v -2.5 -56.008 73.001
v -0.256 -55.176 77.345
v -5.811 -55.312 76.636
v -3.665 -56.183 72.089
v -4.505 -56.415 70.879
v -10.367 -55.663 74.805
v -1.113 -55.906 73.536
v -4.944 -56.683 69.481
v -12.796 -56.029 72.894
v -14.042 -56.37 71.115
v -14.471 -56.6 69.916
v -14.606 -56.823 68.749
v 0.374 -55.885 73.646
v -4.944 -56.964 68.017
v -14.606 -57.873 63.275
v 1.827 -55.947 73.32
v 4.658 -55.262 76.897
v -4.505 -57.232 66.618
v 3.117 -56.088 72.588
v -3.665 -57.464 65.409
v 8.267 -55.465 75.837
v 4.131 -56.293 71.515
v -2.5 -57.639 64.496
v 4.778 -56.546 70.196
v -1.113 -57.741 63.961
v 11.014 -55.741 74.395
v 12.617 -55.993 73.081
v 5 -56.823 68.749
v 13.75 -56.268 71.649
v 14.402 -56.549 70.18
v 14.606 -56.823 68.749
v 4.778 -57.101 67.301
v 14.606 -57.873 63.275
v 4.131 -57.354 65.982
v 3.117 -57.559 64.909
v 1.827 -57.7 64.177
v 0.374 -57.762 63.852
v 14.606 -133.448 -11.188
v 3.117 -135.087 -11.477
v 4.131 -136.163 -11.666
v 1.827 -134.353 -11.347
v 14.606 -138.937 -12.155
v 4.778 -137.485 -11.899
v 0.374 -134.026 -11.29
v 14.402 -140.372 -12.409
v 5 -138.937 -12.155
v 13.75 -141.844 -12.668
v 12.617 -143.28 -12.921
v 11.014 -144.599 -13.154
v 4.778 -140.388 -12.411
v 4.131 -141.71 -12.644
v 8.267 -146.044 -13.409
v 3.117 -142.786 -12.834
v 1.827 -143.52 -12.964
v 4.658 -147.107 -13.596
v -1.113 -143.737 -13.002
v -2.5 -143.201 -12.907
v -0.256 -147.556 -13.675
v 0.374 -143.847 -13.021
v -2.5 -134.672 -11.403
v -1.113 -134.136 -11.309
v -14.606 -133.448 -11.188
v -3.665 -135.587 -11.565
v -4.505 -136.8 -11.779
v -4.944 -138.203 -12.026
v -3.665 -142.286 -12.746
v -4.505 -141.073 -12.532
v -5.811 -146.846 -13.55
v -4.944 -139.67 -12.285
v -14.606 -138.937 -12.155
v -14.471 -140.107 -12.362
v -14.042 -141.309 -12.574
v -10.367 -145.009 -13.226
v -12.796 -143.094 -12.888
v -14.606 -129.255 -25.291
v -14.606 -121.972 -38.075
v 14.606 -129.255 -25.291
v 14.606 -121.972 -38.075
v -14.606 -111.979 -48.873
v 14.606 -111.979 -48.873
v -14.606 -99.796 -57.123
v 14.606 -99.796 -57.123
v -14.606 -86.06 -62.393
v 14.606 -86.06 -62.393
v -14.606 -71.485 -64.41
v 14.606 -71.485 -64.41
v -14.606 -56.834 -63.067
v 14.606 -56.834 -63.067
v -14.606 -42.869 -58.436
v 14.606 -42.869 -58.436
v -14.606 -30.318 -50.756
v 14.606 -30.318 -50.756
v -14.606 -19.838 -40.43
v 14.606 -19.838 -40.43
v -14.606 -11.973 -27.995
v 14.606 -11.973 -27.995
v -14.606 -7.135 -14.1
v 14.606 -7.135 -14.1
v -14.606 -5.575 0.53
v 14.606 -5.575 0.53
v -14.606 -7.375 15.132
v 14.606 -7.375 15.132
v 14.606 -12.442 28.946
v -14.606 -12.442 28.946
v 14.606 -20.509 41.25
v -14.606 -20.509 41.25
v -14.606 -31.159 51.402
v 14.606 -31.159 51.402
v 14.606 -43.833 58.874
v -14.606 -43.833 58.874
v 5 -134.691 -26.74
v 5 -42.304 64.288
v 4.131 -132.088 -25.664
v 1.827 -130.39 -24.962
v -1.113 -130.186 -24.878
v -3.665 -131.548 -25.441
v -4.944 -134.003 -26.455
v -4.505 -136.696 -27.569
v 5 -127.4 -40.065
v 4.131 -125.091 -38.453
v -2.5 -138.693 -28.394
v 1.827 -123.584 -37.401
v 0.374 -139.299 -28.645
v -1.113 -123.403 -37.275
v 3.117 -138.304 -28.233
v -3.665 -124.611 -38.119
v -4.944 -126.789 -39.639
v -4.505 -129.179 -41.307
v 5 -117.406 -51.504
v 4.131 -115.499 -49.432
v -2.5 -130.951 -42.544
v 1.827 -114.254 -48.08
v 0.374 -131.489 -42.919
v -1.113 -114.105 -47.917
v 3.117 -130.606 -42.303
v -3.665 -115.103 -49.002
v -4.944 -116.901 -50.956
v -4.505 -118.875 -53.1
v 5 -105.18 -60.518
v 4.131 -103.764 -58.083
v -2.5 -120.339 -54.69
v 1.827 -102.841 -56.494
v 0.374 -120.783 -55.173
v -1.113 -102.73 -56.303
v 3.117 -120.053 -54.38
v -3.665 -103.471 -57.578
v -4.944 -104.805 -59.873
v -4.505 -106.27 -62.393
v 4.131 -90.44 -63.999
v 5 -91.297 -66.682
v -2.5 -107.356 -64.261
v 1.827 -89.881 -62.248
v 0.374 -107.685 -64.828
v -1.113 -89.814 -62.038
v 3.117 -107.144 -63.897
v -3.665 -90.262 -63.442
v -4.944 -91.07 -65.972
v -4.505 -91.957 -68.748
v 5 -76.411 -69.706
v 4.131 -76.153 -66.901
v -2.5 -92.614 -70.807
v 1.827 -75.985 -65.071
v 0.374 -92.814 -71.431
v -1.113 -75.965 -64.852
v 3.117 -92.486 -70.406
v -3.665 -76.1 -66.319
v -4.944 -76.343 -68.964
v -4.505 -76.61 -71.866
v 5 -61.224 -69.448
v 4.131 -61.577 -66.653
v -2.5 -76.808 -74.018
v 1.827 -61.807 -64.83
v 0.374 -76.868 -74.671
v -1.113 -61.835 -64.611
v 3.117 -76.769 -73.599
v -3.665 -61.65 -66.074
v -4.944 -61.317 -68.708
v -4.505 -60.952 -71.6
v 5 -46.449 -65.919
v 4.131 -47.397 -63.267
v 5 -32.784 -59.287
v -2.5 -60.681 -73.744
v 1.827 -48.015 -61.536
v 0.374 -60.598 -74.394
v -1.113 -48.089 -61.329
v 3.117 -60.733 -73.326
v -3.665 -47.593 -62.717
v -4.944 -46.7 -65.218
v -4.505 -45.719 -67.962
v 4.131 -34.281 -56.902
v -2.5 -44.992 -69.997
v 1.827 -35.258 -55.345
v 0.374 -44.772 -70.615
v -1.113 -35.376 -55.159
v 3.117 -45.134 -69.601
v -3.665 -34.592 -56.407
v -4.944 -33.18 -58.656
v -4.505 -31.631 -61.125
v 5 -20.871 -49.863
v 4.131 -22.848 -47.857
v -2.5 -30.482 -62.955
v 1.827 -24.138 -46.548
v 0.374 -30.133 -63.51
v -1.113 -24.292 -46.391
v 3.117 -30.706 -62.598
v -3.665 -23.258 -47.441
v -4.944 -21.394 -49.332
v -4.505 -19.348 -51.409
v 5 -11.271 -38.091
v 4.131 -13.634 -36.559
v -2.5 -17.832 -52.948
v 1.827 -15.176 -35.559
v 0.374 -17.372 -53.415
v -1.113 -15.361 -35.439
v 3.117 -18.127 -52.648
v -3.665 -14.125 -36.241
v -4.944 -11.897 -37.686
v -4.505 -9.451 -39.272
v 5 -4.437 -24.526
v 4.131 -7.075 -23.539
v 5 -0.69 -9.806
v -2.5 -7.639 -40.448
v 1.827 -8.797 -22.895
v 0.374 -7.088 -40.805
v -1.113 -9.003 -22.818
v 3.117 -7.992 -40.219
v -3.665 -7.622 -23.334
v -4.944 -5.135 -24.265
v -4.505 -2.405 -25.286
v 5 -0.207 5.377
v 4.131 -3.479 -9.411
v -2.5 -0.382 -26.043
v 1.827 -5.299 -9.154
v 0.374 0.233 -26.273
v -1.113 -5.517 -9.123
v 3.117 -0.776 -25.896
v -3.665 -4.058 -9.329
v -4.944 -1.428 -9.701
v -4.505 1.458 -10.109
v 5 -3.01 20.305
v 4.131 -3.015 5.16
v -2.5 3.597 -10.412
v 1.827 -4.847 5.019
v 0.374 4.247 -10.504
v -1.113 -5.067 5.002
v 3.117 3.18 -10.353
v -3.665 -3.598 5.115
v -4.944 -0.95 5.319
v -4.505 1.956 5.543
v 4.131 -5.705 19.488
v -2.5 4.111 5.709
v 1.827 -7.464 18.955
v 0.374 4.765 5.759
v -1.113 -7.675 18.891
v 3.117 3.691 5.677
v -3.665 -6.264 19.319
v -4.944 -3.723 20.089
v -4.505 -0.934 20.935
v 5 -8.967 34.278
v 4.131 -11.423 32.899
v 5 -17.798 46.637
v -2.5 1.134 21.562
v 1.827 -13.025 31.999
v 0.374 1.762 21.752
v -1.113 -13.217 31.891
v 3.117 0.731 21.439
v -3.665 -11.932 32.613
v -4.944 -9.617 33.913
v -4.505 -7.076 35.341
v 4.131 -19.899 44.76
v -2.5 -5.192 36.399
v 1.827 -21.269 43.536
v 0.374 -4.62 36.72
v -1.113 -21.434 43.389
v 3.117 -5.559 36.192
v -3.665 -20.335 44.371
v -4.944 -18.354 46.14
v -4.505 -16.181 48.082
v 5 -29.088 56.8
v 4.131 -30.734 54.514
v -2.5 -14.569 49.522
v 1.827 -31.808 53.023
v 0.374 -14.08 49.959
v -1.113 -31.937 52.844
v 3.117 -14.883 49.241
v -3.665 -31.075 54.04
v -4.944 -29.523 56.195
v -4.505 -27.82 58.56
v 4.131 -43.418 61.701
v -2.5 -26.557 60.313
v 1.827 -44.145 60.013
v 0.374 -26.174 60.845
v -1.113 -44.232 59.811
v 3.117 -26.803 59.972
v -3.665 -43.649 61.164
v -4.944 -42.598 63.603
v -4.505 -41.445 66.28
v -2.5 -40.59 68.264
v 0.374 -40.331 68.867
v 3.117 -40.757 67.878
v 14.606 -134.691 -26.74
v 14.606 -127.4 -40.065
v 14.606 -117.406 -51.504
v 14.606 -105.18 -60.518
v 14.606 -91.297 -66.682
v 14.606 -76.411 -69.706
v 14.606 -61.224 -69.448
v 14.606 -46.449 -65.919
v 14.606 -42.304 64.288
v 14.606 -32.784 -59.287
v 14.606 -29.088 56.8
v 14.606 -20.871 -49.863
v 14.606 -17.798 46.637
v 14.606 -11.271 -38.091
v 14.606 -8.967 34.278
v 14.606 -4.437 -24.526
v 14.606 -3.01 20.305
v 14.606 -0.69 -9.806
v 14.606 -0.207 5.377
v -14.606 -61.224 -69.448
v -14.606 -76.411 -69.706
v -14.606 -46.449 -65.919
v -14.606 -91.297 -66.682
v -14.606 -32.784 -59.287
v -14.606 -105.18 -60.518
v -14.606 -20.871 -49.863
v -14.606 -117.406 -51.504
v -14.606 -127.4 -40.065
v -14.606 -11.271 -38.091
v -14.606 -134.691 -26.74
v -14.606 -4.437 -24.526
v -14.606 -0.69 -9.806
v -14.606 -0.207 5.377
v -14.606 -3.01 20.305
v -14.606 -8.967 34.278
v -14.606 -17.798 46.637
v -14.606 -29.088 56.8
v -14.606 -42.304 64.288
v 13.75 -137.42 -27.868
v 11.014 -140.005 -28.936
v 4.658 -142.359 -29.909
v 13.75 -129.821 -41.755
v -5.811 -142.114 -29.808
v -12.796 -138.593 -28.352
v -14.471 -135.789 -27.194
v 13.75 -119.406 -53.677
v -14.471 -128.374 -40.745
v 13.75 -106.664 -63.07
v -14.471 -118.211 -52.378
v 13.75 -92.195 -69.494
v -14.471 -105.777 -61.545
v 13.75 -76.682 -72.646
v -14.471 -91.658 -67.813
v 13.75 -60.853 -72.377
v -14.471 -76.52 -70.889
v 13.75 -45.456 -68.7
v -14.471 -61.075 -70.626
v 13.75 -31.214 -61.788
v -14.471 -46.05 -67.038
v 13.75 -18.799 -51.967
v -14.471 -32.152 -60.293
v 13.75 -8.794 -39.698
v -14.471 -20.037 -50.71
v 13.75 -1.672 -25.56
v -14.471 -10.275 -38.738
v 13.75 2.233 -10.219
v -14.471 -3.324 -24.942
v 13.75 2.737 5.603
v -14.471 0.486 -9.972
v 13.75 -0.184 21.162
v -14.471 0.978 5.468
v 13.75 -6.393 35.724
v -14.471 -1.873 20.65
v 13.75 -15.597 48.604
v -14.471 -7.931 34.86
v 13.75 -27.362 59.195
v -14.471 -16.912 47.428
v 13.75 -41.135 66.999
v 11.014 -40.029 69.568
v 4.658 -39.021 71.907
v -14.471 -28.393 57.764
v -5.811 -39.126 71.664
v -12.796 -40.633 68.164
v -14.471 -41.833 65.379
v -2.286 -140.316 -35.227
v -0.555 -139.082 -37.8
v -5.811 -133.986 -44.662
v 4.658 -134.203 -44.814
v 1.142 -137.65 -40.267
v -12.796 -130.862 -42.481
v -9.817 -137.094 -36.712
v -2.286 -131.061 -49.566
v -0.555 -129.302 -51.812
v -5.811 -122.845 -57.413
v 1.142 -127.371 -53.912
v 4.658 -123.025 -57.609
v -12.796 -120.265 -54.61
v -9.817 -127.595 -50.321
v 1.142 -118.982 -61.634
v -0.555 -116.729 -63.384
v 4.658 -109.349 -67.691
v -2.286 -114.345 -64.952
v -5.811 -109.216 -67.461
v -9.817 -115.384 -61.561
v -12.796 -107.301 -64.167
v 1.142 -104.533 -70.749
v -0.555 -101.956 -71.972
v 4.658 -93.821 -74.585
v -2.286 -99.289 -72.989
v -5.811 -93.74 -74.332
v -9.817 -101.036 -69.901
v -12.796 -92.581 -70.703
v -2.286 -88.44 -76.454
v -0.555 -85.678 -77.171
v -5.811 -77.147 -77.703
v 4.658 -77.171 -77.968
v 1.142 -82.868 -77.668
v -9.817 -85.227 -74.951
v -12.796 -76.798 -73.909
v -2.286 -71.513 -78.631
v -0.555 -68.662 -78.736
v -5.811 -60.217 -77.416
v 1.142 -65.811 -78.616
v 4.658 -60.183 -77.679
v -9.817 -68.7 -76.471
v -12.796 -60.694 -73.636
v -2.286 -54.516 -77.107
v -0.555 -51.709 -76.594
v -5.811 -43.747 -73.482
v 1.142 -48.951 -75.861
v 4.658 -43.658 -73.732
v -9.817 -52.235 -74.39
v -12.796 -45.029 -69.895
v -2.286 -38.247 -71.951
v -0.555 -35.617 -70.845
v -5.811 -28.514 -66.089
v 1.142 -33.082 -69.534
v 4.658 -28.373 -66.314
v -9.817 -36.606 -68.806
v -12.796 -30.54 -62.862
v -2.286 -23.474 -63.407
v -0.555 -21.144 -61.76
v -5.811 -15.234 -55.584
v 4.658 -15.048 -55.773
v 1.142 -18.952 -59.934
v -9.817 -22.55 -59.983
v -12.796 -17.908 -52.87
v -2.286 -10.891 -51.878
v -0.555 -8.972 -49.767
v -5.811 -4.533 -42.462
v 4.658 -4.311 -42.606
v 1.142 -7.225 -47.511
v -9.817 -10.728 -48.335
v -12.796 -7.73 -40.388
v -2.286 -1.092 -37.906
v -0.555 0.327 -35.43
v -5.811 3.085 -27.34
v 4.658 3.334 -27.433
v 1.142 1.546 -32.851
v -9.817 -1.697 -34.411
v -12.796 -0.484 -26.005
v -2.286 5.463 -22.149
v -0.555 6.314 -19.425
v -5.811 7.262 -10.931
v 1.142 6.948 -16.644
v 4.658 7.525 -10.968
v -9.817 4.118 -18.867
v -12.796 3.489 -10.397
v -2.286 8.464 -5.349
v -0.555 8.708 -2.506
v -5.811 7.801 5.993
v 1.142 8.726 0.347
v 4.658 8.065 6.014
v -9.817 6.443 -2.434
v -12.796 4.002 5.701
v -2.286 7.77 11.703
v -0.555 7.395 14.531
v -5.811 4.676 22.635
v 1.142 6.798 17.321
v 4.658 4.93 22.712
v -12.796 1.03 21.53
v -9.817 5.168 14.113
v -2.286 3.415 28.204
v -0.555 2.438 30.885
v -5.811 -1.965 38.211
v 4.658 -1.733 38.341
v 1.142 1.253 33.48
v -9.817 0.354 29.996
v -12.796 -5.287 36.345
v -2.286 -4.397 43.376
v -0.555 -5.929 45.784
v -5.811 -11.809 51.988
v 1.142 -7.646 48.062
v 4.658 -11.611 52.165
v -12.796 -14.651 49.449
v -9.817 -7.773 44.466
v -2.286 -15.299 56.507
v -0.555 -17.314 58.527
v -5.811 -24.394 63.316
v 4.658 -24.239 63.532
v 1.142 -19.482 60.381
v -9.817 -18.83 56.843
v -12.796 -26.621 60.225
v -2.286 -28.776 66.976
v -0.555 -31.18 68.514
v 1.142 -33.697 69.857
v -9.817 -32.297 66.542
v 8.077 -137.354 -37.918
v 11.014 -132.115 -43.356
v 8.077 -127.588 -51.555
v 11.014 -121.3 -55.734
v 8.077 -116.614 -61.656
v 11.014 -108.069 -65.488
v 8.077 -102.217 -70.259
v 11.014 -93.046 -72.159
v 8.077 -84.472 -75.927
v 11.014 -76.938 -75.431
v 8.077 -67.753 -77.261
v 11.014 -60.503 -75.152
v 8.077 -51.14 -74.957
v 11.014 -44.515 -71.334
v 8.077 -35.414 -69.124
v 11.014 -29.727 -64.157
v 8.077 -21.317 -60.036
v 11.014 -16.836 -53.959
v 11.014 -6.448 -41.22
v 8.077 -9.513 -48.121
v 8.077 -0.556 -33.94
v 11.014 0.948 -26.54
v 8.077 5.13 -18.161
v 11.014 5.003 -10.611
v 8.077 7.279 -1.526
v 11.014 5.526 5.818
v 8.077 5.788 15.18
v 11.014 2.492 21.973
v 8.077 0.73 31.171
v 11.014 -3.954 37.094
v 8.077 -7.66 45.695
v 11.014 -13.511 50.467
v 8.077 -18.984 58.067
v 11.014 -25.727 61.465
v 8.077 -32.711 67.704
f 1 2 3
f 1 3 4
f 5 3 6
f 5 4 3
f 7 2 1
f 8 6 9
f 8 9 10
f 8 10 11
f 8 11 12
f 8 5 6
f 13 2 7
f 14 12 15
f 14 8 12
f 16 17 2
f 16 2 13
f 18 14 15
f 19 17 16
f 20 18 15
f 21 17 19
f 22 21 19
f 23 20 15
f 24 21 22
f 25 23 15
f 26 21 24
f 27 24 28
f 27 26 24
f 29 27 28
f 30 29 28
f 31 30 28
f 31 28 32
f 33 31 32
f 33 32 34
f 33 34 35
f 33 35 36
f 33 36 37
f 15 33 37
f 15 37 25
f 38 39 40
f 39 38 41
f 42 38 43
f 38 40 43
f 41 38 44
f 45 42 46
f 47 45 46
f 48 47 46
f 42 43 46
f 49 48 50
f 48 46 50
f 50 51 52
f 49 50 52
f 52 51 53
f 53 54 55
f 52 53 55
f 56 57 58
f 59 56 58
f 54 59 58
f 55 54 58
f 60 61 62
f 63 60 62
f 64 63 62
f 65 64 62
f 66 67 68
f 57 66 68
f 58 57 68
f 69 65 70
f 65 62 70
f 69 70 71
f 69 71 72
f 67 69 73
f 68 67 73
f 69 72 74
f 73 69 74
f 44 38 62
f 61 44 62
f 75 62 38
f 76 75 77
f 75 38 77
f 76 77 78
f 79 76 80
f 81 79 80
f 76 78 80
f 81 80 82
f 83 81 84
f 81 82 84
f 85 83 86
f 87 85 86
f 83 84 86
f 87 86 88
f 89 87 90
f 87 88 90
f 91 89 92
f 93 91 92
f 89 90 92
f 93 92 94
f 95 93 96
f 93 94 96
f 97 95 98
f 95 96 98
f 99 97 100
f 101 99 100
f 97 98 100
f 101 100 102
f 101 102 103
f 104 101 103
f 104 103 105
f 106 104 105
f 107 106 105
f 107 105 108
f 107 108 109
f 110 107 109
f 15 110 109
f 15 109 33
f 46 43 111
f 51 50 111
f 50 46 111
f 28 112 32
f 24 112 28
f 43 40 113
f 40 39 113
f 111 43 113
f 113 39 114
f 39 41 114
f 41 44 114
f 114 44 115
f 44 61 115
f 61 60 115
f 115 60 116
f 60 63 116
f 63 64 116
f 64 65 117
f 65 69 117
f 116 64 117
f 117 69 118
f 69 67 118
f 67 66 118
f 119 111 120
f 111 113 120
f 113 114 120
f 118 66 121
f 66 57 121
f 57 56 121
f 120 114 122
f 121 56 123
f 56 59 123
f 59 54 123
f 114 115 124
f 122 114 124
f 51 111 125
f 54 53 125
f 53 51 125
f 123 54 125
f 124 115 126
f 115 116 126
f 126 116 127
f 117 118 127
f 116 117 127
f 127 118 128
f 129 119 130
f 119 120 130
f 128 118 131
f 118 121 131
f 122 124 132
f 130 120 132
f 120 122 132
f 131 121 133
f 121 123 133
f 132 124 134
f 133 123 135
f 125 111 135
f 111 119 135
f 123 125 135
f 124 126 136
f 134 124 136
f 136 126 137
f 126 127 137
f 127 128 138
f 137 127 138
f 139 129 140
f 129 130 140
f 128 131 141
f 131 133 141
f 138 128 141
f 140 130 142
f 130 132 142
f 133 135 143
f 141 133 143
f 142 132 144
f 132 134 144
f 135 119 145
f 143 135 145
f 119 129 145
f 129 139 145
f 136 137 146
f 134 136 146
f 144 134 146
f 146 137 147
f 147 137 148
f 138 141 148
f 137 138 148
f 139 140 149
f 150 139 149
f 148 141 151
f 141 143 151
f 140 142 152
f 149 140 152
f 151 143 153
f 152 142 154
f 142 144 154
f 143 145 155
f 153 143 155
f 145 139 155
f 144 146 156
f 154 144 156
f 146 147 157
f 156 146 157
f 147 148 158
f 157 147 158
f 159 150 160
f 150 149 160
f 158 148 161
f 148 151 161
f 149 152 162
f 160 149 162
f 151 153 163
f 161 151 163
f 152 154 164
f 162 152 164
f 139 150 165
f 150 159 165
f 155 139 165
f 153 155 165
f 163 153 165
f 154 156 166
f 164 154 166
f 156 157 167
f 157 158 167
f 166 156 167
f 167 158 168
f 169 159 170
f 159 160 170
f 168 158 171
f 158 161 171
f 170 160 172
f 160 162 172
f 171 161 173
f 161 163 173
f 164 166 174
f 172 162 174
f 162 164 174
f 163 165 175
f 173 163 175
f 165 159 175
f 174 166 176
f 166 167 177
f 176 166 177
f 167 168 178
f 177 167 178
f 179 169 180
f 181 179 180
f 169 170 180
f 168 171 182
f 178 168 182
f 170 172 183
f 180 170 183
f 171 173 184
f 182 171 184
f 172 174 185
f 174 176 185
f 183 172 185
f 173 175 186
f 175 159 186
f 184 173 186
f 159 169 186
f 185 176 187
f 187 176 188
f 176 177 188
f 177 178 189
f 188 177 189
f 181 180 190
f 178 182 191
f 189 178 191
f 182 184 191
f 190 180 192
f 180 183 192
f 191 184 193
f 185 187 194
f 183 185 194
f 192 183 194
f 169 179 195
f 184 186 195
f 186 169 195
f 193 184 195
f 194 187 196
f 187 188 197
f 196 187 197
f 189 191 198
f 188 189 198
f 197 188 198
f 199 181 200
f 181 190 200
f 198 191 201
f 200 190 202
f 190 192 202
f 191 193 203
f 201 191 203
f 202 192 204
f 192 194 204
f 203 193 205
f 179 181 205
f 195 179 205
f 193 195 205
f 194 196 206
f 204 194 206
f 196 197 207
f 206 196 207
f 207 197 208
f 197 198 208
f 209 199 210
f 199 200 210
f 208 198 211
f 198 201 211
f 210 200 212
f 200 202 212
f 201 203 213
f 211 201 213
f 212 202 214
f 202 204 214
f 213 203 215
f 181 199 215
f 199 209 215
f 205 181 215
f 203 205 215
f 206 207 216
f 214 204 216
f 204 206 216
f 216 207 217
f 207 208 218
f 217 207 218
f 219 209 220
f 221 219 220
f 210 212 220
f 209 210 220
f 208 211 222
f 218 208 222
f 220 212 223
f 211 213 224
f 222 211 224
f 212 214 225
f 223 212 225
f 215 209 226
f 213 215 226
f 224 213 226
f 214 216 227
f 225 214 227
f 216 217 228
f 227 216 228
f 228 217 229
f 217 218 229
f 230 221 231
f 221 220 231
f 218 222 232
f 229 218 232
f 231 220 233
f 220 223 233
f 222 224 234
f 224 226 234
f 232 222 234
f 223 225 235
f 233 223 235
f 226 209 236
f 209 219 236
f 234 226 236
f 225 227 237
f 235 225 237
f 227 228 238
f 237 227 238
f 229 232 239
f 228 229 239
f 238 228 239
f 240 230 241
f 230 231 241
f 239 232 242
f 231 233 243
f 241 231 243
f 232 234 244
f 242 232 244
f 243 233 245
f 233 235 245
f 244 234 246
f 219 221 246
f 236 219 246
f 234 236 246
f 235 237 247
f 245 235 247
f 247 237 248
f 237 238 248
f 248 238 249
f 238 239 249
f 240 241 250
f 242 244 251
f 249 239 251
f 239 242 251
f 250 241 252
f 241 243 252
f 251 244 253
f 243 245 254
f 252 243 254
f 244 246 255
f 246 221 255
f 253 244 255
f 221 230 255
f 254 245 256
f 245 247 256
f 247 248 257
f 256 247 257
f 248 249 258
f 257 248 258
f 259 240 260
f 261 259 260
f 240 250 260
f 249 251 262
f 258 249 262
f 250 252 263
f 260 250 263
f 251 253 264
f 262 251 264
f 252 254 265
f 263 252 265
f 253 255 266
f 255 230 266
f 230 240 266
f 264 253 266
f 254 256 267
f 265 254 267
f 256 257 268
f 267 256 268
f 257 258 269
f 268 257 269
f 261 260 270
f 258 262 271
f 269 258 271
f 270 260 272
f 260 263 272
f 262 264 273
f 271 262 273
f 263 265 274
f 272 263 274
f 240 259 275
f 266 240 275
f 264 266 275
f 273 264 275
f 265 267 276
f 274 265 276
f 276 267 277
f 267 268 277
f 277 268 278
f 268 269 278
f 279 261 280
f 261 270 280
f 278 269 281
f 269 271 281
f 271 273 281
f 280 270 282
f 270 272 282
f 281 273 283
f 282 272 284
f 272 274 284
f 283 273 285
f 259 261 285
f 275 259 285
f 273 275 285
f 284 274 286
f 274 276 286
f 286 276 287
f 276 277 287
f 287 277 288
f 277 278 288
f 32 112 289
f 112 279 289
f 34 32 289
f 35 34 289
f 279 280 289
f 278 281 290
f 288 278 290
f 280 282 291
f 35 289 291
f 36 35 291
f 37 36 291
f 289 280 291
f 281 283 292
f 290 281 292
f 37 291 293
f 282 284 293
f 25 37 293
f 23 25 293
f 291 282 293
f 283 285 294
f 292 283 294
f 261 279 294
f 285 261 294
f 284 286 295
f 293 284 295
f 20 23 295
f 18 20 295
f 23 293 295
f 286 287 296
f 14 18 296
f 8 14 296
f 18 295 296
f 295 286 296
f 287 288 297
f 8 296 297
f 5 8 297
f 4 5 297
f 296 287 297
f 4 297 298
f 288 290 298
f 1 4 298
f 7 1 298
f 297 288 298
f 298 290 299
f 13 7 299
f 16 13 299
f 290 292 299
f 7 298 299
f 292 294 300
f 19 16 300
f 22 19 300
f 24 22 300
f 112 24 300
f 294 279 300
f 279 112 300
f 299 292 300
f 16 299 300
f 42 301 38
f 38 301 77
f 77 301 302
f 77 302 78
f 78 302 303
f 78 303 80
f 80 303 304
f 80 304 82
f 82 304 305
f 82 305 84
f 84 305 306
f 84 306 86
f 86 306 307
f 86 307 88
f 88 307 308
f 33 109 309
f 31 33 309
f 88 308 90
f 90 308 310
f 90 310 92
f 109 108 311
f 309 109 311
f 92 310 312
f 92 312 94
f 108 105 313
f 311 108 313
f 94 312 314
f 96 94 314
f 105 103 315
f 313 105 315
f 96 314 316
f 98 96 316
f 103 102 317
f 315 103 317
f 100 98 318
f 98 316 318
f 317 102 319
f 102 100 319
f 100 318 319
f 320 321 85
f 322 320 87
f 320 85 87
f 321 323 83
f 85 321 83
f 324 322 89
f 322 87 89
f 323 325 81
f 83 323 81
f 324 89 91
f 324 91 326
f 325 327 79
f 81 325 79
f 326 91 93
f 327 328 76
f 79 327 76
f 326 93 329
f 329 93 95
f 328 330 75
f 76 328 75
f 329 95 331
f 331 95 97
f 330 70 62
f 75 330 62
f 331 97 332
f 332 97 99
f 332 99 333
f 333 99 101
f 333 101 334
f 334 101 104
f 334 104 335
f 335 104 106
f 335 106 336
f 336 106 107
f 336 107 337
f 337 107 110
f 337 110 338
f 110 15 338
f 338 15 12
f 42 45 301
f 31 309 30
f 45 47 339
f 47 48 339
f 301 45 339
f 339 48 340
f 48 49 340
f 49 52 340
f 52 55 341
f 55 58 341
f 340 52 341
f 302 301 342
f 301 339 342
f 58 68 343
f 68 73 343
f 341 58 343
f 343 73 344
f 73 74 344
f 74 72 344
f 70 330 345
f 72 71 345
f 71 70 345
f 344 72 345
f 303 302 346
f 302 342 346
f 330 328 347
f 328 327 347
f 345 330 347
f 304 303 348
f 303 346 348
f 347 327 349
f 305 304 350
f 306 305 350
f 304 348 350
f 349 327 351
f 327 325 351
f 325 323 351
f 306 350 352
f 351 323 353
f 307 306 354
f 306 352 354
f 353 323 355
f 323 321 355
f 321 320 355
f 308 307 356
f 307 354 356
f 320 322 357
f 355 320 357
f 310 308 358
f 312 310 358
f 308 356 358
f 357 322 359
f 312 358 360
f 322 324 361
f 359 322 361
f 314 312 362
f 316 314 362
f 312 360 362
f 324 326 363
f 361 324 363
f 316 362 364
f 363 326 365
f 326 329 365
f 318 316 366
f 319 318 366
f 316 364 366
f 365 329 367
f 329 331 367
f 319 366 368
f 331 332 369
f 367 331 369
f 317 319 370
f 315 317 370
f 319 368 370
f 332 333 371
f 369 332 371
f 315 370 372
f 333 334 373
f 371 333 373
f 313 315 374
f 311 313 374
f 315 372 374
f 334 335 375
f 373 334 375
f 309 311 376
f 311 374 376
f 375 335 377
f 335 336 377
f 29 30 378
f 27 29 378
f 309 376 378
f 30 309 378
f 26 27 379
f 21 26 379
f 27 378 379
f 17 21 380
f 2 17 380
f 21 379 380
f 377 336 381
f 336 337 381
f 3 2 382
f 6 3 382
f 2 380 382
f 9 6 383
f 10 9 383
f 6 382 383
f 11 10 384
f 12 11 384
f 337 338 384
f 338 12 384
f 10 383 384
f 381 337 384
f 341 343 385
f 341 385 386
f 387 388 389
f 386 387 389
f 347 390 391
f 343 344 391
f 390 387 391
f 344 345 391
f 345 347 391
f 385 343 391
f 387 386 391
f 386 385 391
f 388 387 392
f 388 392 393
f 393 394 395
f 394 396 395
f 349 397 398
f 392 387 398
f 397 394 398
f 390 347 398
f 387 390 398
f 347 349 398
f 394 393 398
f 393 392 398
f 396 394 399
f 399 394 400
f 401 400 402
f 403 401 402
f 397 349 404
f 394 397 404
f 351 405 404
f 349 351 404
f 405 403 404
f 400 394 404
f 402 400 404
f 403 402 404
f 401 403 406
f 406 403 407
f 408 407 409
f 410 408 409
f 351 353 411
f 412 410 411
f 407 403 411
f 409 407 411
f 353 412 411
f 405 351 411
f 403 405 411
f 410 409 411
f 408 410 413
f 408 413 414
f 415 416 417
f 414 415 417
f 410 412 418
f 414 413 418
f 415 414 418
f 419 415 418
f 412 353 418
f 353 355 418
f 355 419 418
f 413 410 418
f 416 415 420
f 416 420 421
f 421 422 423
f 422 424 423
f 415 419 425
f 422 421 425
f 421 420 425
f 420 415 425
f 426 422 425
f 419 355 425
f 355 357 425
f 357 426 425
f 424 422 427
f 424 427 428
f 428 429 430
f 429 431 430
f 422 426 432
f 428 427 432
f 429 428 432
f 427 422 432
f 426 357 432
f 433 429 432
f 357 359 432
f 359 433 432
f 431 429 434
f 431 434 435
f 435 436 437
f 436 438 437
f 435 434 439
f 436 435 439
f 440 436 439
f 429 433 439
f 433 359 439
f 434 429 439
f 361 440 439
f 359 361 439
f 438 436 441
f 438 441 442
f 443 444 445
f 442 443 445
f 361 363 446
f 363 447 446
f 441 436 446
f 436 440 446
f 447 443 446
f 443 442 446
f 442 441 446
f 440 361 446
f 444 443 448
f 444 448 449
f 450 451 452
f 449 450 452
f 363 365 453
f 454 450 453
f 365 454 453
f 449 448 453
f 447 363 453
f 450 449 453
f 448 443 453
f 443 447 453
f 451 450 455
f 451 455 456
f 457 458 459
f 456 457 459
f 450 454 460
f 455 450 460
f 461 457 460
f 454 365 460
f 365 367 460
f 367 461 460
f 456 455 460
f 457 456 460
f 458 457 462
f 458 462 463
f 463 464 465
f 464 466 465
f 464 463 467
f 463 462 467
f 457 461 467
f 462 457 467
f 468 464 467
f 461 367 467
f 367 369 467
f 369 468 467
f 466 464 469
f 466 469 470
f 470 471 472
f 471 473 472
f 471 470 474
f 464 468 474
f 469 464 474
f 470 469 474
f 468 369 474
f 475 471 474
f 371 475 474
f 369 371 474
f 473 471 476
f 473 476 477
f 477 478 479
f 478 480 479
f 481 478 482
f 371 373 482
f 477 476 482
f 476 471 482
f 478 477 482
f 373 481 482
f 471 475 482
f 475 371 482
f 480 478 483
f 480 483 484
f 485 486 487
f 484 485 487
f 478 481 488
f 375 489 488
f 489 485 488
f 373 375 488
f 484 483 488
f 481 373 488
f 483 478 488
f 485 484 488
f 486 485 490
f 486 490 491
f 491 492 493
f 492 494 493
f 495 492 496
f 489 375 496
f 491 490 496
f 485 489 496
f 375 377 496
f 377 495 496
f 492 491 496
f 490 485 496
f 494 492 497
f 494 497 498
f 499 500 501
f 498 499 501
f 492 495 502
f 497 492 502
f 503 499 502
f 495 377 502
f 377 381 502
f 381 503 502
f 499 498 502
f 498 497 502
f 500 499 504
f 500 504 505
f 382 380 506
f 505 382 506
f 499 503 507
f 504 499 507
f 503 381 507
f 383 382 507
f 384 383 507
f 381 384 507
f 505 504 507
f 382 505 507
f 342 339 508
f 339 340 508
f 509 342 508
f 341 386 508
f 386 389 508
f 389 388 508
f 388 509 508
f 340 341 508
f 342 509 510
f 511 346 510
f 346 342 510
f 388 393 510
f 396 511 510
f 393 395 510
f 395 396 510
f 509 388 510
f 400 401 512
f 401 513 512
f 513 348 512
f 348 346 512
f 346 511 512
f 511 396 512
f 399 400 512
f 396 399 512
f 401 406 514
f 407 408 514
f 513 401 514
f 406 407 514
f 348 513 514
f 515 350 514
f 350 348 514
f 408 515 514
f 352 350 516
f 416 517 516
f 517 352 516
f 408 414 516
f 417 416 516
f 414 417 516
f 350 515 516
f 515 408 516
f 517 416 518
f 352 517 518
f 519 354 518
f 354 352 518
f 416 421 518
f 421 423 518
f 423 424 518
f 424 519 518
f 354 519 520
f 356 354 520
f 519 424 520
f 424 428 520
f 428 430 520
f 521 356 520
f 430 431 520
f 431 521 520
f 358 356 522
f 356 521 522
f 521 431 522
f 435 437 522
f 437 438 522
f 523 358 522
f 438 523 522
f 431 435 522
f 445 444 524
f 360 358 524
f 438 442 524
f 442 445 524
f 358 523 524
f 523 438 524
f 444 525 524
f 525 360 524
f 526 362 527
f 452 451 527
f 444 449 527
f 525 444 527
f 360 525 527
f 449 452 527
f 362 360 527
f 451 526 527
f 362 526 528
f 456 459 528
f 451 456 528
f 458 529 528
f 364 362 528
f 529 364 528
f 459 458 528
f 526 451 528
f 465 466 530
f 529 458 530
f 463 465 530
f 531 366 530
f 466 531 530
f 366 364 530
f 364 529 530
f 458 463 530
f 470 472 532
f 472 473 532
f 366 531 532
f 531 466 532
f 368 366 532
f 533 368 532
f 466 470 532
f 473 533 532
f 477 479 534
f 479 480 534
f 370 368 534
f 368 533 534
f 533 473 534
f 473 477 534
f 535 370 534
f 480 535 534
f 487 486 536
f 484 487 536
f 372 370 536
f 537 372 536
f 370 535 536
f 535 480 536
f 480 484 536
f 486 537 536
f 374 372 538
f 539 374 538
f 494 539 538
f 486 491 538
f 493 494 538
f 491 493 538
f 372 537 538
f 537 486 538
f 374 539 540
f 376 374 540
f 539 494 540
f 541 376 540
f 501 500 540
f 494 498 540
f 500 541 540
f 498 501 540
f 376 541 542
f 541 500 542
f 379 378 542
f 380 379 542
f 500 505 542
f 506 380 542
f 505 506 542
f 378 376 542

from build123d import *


with BuildPart() as f3:
    # F3: sweep along a path in F2
    with BuildLine(Plane.YZ) as f3_path:
        ThreePointArc((-1.0634572891, 12.1553724367), (-119.1290182748, 49.8632085144), (-83.1765347934, -68.7486649386))
    # F0 (on Top) → F3 (sweep)
    with BuildSketch(Plane.XY):
        with BuildLine():
            add(Edge.make_bspline(
                [(14.6060865372, 0), (14.6060865372, 8.7539134547), (0, 8.7539134547)],
                knots=[3.1415926536, 3.1415926536, 3.1415926536, 4.7123889804, 4.7123889804, 4.7123889804], degree=2, weights=[1, 0.7071067812, 1]))
            add(Edge.make_bspline(
                [(0, 8.7539134547), (-14.6060865372, 8.7539134547), (-14.6060865372, 0)],
                knots=[1.5707963268, 1.5707963268, 1.5707963268, 3.1415926536, 3.1415926536, 3.1415926536], degree=2, weights=[1, 0.7071067812, 1]))
            Line((-14.6060865372, 0), (-5, 0))
            ThreePointArc((-5, 0), (0, 5), (5, 0))
            Line((5, 0), (14.6060865372, 0))
        make_face()
        with BuildLine():
            Line((-5, 0), (-14.6060865372, 0))
            Line((-14.6060865372, 0), (-14.6060865372, -5.5730552413))
            Line((-14.6060865372, -5.5730552413), (14.6060865372, -5.5730552413))
            Line((14.6060865372, -5.5730552413), (14.6060865372, 0))
            Line((14.6060865372, 0), (5, 0))
            ThreePointArc((5, 0), (0, -5), (-5, 0))
        make_face()
    sweep(path=f3_path.line)


solid = f3.part
